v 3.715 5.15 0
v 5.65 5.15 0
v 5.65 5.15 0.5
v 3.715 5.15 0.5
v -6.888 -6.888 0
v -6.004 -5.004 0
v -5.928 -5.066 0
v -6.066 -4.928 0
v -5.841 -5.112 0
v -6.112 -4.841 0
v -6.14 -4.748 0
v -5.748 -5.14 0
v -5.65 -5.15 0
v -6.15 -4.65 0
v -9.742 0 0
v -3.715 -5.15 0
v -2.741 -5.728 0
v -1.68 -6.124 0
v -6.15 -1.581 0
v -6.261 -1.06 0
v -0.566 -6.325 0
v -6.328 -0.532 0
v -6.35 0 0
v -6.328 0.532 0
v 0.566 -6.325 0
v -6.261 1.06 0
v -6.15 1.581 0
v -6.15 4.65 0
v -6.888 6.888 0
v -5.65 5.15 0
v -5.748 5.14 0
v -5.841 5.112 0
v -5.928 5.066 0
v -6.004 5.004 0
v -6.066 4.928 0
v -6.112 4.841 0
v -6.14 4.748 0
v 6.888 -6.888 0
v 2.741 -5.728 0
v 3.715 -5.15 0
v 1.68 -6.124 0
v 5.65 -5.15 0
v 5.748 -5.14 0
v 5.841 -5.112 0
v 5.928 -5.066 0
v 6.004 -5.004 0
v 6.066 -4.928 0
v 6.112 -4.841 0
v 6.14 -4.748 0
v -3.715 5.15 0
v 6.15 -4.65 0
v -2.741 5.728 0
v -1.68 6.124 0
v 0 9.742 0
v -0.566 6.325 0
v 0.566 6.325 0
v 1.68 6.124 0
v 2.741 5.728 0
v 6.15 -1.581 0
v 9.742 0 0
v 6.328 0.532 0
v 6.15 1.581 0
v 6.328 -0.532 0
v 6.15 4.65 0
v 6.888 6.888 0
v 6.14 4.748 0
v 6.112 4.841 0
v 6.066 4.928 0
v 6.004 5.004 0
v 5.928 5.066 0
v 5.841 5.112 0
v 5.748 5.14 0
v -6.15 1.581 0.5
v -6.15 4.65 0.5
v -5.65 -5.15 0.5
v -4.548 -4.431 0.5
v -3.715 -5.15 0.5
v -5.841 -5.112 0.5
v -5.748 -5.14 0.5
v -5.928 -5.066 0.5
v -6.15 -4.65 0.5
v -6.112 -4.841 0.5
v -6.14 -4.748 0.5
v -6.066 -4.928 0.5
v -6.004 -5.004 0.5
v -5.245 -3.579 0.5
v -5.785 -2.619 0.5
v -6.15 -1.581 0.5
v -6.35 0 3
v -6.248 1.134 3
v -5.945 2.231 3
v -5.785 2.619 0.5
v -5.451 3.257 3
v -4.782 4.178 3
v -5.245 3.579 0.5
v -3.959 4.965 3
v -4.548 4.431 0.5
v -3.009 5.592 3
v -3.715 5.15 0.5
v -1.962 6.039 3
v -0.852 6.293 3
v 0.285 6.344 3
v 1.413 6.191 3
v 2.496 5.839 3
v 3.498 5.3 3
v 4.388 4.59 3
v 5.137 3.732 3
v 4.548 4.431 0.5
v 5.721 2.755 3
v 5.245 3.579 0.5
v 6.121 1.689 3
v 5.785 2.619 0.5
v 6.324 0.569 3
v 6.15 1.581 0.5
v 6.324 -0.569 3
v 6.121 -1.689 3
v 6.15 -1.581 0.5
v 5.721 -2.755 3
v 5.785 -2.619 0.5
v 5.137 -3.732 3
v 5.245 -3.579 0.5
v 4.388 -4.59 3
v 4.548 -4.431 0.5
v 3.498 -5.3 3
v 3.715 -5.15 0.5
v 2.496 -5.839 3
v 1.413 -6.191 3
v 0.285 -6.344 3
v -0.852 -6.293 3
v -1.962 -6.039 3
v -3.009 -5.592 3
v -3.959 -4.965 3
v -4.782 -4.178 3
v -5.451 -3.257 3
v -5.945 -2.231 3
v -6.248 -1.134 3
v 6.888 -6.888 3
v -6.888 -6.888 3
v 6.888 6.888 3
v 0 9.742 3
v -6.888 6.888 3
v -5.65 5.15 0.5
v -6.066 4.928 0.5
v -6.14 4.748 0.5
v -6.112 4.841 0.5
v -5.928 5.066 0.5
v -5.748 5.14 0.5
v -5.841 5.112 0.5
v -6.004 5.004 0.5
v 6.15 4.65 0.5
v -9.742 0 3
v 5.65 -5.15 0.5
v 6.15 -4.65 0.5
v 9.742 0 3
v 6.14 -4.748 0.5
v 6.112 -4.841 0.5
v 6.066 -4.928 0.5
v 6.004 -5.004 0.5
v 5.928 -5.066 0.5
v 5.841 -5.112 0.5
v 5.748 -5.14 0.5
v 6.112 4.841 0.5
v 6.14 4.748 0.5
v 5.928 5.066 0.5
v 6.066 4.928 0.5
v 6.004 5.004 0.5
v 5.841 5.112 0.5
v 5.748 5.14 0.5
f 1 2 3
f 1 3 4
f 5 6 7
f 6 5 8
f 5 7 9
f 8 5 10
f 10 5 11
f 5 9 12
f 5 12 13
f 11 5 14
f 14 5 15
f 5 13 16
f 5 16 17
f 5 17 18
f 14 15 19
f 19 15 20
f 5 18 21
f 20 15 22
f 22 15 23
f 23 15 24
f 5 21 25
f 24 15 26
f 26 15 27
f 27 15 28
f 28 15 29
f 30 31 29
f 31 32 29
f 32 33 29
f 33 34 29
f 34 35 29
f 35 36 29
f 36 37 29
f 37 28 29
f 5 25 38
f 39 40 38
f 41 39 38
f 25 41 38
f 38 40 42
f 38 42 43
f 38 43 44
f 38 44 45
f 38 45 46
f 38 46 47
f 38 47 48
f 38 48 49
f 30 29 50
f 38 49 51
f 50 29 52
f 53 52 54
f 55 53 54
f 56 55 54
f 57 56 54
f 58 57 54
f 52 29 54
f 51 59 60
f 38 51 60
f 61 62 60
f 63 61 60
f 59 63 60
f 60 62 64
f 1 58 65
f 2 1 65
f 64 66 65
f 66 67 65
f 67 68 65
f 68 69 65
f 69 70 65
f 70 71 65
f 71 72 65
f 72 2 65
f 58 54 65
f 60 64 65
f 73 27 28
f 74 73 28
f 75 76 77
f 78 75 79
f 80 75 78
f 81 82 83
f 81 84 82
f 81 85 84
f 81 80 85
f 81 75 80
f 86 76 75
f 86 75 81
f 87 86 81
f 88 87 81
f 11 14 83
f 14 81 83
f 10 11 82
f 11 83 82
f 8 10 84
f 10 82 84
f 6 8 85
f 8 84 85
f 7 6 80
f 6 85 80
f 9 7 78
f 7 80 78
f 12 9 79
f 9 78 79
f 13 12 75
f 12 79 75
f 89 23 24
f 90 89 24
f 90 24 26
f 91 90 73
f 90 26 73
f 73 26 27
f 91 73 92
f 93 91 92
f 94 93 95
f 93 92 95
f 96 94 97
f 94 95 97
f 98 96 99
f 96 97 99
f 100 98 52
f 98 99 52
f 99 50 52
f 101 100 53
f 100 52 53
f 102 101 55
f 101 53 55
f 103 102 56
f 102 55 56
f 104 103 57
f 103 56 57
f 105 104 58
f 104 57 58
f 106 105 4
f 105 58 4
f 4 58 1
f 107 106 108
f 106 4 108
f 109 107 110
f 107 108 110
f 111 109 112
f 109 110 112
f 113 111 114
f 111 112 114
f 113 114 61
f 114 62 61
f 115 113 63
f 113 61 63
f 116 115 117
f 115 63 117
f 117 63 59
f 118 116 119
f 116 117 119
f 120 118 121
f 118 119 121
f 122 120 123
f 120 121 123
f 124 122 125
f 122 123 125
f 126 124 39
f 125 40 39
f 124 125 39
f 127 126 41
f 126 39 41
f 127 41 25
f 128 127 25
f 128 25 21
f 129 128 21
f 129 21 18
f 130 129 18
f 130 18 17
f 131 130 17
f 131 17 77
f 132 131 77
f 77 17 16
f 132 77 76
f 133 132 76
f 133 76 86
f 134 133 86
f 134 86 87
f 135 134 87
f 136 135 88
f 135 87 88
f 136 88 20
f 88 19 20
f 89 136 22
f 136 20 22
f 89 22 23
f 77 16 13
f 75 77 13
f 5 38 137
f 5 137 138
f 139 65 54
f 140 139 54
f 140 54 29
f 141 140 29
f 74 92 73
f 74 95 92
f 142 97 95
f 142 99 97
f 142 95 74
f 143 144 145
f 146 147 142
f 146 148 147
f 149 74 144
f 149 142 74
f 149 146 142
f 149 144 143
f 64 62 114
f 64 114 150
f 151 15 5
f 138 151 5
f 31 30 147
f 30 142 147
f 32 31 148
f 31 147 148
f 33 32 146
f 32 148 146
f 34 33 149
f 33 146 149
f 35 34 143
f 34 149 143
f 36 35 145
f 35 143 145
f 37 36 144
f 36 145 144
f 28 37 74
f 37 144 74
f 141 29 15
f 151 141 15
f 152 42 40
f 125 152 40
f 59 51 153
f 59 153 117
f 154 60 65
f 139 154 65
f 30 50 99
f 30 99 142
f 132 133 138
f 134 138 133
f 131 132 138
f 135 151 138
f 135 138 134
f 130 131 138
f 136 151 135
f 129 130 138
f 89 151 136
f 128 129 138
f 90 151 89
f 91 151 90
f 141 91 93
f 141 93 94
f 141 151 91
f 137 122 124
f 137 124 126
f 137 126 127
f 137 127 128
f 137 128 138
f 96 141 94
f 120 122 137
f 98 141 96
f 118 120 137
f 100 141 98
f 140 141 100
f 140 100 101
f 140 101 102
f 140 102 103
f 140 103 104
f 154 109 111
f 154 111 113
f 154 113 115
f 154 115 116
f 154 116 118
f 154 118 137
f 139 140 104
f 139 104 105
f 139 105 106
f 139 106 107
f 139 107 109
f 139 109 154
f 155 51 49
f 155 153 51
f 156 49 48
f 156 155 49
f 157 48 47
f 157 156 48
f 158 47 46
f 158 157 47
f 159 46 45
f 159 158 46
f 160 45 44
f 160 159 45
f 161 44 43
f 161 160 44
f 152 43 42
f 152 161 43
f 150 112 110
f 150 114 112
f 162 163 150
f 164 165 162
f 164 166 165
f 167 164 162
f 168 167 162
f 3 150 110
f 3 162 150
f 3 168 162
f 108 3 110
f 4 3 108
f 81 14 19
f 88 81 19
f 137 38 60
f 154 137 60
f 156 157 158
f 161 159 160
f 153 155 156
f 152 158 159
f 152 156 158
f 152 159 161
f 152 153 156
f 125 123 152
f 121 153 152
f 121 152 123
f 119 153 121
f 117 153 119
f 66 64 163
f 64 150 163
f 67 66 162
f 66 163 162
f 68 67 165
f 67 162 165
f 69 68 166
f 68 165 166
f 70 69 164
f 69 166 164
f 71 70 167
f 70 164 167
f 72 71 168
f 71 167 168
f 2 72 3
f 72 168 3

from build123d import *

# Parameters (mm, degrees)
BOSS_EXTRUDE1_DEPTH     = 3
SKETCH4_W               = 12.3
SKETCH4_H               = 10.3
CUT_EXTRUDE2_DEPTH      = 0.5
FILLET1_R               = 0.5
F_1_2_20_TAPPED_HOLE1_D = 12.7
CUT_EXTRUDE3_REACH      = 5


with BuildPart() as part:
    # Sketch2 → Boss-Extrude1 (new body)
    with BuildSketch(Plane.XY):
        Polygon((0, 9.741529803), (-6.888301783, 6.888301783), (-9.741529803, 0), (-6.888301783, -6.888301783), (0, -9.741529803), (6.888301783, -6.888301783), (9.741529803, 0), (6.888301783, 6.888301783), align=None)
    extrude(amount=BOSS_EXTRUDE1_DEPTH)

    # Sketch4 → Cut-Extrude2 (cut)
    with BuildSketch(Plane(origin=(0, 0, 0), x_dir=(-1, 0, 0), z_dir=(0, 0, -1))):
        Rectangle(SKETCH4_W, SKETCH4_H)
    extrude(amount=-CUT_EXTRUDE2_DEPTH, mode=Mode.SUBTRACT)

    # Fillet1
    fillet1_edges = [part.edges().sort_by_distance(p)[0] for p in [
        (-6.15, 5.15, 0.25),
        (-6.15, -5.15, 0.25),
        (6.15, -5.15, 0.25),
        (6.15, 5.15, 0.25),
    ]]
    fillet(fillet1_edges, radius=FILLET1_R)

    # 1/2-20 Tapped Hole1 (through all)
    with Locations(Plane.XY.offset(3)):
        with Locations((0, 0)):
            Hole(F_1_2_20_TAPPED_HOLE1_D / 2)

    # Sketch7 → Cut-Extrude3 (cut, up to next)
    with BuildSketch(Plane(origin=(0, 0, 0), x_dir=(-1, 0, 0), z_dir=(0, 0, -1)), mode=Mode.PRIVATE) as cut_extrude3_sk1:
        Polygon((-6.888301783, -6.888301783), (6.888301783, -6.888301783), (0, -9.741529803), align=None)
    cut_extrude3_tool1 = extrude(cut_extrude3_sk1.sketch, amount=-CUT_EXTRUDE3_REACH, mode=Mode.PRIVATE) & part.part
    add(cut_extrude3_tool1.solids().sort_by_distance((0, -7.839378, 0))[0], mode=Mode.SUBTRACT)


solid = part.part
